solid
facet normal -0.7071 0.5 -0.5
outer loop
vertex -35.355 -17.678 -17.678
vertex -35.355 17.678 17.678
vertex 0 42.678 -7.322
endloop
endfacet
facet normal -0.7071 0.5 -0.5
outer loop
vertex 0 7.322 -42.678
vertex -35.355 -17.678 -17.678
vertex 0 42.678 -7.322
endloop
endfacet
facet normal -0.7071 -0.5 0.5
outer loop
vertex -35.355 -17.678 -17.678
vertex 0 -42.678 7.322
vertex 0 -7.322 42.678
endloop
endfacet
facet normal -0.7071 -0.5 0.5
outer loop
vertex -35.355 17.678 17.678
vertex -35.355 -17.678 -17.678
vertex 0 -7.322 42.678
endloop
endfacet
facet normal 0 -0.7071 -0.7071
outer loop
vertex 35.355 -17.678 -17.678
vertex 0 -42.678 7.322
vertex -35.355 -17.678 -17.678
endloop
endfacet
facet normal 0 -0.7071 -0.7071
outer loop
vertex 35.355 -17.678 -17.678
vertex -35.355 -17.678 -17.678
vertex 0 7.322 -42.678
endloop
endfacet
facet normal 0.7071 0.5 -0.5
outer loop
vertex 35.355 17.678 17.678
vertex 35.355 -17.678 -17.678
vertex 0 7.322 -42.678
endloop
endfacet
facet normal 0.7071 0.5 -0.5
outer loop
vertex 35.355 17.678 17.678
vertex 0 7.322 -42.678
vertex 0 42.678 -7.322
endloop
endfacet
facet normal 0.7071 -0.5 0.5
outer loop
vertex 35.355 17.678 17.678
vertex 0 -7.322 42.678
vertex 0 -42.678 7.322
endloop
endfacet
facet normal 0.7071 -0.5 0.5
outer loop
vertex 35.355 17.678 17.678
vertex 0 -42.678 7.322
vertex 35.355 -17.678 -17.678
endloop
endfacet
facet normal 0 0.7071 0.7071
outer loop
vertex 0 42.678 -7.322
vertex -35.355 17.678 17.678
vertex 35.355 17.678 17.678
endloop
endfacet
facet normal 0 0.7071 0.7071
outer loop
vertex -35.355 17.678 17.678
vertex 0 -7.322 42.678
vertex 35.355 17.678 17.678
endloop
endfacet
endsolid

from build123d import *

# Parameters (mm, degrees)
F1_W     = 50
F1_H     = 50
F2_DEPTH = 25
F4_ANGLE = 45
F6_ANGLE = 45


with BuildPart() as f2:
    # F1 (on Top) → F2 (new body, symmetric)
    with BuildSketch(Plane.XY):
        Rectangle(F1_W, F1_H)
    extrude(amount=F2_DEPTH, both=True)


with BuildPart() as f2_1:
    # F4: moved
    add(f2.part.rotate(Axis((0, 0, 0), (0, 1, 0)), F4_ANGLE))


with BuildPart() as f2_2:
    # F6: moved
    add(f2_1.part.rotate(Axis((0, 0, 0), (1, 0, 0)), F6_ANGLE))


solid = f2_2.part
